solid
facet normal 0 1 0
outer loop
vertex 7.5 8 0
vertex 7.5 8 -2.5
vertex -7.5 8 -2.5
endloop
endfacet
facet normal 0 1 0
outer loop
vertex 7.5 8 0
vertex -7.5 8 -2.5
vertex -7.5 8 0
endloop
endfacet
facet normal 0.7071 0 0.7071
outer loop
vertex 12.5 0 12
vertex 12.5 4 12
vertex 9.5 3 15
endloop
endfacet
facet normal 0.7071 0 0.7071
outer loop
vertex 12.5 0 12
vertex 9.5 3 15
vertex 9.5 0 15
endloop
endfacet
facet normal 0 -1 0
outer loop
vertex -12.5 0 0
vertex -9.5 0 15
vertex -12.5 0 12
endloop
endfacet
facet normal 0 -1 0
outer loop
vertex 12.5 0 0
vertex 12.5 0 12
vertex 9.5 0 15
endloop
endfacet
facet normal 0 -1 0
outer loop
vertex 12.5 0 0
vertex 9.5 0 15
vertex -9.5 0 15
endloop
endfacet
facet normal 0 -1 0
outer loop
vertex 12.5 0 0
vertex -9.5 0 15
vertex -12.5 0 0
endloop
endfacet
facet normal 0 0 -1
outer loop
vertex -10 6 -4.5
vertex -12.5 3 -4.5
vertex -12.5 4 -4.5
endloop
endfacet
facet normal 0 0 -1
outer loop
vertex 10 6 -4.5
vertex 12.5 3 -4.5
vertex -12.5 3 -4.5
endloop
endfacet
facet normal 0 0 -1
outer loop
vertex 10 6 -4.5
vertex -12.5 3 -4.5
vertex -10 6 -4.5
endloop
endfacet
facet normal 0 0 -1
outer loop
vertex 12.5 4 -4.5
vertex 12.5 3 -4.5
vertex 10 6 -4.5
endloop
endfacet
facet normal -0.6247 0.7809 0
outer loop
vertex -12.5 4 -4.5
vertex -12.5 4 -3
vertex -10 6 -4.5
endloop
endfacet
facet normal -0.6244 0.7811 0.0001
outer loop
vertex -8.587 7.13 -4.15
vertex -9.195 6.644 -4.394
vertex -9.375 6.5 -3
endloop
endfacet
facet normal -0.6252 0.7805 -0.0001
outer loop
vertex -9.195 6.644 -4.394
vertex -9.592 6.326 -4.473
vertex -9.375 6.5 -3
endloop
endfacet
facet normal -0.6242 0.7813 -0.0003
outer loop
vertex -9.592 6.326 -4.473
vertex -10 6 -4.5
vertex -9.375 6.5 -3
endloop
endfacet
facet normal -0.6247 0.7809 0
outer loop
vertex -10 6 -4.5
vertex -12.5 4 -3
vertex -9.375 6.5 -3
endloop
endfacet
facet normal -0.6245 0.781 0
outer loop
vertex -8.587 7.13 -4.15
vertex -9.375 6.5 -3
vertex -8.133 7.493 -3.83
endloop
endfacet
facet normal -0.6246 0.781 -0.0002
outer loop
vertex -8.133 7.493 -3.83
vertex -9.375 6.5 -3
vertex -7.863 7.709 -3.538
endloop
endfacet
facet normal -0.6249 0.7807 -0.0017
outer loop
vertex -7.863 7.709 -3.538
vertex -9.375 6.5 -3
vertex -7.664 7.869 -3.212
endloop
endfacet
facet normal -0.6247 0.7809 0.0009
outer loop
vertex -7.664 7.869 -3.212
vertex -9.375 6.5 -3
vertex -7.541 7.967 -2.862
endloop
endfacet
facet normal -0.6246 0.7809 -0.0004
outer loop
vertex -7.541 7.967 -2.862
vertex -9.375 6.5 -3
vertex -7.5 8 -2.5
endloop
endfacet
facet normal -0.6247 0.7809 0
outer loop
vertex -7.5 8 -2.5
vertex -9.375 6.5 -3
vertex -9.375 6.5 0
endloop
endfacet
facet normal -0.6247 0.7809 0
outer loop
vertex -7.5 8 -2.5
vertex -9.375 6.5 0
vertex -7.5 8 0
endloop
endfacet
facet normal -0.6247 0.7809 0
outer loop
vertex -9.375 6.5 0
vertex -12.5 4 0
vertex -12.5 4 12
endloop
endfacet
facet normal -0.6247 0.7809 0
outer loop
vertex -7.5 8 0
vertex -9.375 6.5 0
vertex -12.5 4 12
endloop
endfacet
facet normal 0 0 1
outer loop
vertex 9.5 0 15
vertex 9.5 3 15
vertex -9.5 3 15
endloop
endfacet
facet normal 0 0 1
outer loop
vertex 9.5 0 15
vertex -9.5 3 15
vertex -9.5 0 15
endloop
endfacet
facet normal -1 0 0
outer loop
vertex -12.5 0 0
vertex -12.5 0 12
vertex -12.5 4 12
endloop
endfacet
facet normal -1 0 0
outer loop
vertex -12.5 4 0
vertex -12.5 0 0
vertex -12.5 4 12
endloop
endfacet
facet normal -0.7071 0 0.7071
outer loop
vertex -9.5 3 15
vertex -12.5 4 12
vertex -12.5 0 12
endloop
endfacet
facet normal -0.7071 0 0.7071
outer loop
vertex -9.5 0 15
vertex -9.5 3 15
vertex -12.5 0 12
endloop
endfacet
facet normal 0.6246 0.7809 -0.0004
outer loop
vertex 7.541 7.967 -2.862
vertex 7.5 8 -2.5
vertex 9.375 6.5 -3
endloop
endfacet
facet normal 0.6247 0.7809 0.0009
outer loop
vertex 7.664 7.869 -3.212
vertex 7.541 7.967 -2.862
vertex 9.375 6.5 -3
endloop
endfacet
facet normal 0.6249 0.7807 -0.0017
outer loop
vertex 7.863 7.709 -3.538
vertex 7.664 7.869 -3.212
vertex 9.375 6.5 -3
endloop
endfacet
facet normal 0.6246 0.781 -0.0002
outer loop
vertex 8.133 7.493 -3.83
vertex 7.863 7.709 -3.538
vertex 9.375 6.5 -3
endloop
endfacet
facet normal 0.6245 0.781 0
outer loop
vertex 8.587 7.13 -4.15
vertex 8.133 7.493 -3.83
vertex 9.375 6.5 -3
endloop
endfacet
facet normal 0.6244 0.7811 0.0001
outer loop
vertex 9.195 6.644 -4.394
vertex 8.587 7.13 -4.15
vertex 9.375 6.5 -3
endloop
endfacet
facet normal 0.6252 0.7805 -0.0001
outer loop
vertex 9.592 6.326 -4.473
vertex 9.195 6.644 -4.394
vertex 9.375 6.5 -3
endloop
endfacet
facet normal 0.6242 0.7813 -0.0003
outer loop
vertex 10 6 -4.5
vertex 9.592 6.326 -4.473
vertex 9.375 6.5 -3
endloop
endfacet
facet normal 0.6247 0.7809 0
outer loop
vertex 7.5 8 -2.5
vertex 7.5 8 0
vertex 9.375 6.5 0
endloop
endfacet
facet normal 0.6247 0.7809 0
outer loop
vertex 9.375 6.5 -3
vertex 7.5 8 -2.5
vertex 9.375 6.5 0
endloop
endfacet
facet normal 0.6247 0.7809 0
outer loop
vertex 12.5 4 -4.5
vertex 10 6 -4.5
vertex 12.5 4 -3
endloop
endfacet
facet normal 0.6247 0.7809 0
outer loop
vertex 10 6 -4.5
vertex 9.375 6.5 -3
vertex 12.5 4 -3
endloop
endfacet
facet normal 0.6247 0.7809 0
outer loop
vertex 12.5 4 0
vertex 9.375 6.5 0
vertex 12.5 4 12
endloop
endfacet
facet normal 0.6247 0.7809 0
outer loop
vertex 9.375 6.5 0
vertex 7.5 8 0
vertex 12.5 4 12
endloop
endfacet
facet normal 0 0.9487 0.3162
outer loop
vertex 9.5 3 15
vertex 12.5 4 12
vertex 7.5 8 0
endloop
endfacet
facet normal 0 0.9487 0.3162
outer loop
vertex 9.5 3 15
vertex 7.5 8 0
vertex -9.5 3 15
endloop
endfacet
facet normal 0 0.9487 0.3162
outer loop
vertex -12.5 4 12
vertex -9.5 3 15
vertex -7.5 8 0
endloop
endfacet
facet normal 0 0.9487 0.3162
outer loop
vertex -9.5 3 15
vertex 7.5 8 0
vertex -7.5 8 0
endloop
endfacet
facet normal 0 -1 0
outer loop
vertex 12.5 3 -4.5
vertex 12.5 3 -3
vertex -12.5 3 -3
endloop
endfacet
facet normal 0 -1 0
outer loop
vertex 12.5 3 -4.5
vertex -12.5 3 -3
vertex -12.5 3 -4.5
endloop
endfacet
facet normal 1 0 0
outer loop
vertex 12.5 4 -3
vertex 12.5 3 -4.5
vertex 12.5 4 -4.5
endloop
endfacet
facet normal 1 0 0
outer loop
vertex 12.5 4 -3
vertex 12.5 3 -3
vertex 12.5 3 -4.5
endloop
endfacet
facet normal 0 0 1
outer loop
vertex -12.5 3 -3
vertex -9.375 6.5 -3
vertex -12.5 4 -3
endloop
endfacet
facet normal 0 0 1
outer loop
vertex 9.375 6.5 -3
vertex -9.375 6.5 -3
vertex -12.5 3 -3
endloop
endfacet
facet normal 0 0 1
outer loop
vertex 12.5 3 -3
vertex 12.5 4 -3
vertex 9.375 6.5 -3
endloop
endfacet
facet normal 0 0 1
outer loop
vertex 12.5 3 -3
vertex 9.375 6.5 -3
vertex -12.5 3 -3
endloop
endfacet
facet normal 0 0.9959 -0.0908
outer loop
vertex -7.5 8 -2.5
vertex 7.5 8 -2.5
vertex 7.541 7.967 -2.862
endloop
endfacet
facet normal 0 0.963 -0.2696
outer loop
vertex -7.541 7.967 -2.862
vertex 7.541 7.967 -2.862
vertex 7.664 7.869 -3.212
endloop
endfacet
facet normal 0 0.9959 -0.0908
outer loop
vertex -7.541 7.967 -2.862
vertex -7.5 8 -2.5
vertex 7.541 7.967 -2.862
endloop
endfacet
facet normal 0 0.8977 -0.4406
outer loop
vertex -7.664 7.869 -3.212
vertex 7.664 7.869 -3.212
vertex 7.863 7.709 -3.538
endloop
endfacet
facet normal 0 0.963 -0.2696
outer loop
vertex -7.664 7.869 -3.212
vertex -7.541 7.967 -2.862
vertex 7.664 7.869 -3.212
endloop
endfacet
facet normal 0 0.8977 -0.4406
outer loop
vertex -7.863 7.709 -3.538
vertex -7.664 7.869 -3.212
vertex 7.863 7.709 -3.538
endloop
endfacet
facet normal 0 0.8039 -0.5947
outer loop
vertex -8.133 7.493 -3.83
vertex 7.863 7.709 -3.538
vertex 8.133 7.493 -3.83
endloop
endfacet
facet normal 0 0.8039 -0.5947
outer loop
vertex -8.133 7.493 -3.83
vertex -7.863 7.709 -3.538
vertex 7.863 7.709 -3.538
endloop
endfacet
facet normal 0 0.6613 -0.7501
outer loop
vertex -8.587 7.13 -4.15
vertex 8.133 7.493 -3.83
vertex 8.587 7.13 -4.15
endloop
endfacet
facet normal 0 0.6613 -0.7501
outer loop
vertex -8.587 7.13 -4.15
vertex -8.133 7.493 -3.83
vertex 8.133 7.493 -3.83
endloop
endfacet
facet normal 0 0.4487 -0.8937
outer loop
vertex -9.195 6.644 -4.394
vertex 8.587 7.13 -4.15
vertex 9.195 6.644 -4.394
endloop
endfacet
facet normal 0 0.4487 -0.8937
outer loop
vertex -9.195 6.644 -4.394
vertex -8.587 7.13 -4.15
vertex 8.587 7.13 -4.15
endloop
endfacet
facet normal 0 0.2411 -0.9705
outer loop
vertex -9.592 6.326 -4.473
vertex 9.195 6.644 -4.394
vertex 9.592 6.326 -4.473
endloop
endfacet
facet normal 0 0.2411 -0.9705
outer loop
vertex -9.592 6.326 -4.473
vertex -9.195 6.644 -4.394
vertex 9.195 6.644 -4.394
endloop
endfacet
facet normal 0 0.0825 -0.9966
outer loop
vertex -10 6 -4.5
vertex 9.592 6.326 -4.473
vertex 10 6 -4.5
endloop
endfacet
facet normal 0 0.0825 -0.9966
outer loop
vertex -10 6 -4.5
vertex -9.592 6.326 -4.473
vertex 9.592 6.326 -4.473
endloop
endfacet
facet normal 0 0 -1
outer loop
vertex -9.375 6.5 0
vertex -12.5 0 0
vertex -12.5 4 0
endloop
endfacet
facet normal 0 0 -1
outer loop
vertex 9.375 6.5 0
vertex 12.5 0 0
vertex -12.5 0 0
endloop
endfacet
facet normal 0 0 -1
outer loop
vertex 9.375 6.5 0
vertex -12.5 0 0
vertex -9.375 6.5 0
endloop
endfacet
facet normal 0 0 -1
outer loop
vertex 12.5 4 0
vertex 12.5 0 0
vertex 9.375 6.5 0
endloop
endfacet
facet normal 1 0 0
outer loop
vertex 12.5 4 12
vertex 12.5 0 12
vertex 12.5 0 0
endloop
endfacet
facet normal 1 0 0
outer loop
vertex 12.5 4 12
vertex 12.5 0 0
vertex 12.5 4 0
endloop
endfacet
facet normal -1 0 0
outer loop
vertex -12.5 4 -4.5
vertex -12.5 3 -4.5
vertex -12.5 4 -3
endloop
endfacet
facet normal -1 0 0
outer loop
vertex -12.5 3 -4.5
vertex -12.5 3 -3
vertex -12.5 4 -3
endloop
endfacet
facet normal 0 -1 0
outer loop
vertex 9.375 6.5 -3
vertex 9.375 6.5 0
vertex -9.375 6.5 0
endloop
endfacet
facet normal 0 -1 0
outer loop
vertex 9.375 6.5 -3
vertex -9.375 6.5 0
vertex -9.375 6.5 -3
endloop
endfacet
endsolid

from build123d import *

# Parameters (mm, degrees)
F3_DEPTH = 12.5
F1_DEPTH = 25
F4_SIZE2 = 15
F4_SIZE  = 5
F5_SIZE  = 3
F6_R     = 2


with BuildPart() as f3:
    # F2 (on Right) → F3 (new body, symmetric)
    with BuildSketch(Plane.YZ):
        Polygon((0, 15), (0, 0), (6.5, 0), (6.5, -3), (3, -3), (3, -4.5), (8, -4.5), (8, 15), align=None)
    extrude(amount=F3_DEPTH, both=True)

    # F0 (on face) → F1 (cut)
    with BuildSketch(Plane.XY.offset(15)):
        Polygon((7.5, 8), (12.5, 4), (12.5, 8), align=None)
        Polygon((-12.5, 4), (-7.5, 8), (-12.5, 8), align=None)
    extrude(amount=-F1_DEPTH, mode=Mode.SUBTRACT)

    # F4
    f4_edges = [f3.edges().sort_by_distance(p)[0] for p in [
        (0, 8, 15),
    ]]
    chamfer(f4_edges, length=F4_SIZE, length2=F4_SIZE2)

    # F5
    f5_edges = [f3.edges().sort_by_distance(p)[0] for p in [
        (-12.5, 1.5, 15),
        (12.5, 1.5, 15),
    ]]
    chamfer(f5_edges, length=F5_SIZE)

    # F6
    f6_edges = [f3.edges().sort_by_distance(p)[0] for p in [
        (0, 8, -4.5),
    ]]
    fillet(f6_edges, radius=F6_R)


solid = f3.part
